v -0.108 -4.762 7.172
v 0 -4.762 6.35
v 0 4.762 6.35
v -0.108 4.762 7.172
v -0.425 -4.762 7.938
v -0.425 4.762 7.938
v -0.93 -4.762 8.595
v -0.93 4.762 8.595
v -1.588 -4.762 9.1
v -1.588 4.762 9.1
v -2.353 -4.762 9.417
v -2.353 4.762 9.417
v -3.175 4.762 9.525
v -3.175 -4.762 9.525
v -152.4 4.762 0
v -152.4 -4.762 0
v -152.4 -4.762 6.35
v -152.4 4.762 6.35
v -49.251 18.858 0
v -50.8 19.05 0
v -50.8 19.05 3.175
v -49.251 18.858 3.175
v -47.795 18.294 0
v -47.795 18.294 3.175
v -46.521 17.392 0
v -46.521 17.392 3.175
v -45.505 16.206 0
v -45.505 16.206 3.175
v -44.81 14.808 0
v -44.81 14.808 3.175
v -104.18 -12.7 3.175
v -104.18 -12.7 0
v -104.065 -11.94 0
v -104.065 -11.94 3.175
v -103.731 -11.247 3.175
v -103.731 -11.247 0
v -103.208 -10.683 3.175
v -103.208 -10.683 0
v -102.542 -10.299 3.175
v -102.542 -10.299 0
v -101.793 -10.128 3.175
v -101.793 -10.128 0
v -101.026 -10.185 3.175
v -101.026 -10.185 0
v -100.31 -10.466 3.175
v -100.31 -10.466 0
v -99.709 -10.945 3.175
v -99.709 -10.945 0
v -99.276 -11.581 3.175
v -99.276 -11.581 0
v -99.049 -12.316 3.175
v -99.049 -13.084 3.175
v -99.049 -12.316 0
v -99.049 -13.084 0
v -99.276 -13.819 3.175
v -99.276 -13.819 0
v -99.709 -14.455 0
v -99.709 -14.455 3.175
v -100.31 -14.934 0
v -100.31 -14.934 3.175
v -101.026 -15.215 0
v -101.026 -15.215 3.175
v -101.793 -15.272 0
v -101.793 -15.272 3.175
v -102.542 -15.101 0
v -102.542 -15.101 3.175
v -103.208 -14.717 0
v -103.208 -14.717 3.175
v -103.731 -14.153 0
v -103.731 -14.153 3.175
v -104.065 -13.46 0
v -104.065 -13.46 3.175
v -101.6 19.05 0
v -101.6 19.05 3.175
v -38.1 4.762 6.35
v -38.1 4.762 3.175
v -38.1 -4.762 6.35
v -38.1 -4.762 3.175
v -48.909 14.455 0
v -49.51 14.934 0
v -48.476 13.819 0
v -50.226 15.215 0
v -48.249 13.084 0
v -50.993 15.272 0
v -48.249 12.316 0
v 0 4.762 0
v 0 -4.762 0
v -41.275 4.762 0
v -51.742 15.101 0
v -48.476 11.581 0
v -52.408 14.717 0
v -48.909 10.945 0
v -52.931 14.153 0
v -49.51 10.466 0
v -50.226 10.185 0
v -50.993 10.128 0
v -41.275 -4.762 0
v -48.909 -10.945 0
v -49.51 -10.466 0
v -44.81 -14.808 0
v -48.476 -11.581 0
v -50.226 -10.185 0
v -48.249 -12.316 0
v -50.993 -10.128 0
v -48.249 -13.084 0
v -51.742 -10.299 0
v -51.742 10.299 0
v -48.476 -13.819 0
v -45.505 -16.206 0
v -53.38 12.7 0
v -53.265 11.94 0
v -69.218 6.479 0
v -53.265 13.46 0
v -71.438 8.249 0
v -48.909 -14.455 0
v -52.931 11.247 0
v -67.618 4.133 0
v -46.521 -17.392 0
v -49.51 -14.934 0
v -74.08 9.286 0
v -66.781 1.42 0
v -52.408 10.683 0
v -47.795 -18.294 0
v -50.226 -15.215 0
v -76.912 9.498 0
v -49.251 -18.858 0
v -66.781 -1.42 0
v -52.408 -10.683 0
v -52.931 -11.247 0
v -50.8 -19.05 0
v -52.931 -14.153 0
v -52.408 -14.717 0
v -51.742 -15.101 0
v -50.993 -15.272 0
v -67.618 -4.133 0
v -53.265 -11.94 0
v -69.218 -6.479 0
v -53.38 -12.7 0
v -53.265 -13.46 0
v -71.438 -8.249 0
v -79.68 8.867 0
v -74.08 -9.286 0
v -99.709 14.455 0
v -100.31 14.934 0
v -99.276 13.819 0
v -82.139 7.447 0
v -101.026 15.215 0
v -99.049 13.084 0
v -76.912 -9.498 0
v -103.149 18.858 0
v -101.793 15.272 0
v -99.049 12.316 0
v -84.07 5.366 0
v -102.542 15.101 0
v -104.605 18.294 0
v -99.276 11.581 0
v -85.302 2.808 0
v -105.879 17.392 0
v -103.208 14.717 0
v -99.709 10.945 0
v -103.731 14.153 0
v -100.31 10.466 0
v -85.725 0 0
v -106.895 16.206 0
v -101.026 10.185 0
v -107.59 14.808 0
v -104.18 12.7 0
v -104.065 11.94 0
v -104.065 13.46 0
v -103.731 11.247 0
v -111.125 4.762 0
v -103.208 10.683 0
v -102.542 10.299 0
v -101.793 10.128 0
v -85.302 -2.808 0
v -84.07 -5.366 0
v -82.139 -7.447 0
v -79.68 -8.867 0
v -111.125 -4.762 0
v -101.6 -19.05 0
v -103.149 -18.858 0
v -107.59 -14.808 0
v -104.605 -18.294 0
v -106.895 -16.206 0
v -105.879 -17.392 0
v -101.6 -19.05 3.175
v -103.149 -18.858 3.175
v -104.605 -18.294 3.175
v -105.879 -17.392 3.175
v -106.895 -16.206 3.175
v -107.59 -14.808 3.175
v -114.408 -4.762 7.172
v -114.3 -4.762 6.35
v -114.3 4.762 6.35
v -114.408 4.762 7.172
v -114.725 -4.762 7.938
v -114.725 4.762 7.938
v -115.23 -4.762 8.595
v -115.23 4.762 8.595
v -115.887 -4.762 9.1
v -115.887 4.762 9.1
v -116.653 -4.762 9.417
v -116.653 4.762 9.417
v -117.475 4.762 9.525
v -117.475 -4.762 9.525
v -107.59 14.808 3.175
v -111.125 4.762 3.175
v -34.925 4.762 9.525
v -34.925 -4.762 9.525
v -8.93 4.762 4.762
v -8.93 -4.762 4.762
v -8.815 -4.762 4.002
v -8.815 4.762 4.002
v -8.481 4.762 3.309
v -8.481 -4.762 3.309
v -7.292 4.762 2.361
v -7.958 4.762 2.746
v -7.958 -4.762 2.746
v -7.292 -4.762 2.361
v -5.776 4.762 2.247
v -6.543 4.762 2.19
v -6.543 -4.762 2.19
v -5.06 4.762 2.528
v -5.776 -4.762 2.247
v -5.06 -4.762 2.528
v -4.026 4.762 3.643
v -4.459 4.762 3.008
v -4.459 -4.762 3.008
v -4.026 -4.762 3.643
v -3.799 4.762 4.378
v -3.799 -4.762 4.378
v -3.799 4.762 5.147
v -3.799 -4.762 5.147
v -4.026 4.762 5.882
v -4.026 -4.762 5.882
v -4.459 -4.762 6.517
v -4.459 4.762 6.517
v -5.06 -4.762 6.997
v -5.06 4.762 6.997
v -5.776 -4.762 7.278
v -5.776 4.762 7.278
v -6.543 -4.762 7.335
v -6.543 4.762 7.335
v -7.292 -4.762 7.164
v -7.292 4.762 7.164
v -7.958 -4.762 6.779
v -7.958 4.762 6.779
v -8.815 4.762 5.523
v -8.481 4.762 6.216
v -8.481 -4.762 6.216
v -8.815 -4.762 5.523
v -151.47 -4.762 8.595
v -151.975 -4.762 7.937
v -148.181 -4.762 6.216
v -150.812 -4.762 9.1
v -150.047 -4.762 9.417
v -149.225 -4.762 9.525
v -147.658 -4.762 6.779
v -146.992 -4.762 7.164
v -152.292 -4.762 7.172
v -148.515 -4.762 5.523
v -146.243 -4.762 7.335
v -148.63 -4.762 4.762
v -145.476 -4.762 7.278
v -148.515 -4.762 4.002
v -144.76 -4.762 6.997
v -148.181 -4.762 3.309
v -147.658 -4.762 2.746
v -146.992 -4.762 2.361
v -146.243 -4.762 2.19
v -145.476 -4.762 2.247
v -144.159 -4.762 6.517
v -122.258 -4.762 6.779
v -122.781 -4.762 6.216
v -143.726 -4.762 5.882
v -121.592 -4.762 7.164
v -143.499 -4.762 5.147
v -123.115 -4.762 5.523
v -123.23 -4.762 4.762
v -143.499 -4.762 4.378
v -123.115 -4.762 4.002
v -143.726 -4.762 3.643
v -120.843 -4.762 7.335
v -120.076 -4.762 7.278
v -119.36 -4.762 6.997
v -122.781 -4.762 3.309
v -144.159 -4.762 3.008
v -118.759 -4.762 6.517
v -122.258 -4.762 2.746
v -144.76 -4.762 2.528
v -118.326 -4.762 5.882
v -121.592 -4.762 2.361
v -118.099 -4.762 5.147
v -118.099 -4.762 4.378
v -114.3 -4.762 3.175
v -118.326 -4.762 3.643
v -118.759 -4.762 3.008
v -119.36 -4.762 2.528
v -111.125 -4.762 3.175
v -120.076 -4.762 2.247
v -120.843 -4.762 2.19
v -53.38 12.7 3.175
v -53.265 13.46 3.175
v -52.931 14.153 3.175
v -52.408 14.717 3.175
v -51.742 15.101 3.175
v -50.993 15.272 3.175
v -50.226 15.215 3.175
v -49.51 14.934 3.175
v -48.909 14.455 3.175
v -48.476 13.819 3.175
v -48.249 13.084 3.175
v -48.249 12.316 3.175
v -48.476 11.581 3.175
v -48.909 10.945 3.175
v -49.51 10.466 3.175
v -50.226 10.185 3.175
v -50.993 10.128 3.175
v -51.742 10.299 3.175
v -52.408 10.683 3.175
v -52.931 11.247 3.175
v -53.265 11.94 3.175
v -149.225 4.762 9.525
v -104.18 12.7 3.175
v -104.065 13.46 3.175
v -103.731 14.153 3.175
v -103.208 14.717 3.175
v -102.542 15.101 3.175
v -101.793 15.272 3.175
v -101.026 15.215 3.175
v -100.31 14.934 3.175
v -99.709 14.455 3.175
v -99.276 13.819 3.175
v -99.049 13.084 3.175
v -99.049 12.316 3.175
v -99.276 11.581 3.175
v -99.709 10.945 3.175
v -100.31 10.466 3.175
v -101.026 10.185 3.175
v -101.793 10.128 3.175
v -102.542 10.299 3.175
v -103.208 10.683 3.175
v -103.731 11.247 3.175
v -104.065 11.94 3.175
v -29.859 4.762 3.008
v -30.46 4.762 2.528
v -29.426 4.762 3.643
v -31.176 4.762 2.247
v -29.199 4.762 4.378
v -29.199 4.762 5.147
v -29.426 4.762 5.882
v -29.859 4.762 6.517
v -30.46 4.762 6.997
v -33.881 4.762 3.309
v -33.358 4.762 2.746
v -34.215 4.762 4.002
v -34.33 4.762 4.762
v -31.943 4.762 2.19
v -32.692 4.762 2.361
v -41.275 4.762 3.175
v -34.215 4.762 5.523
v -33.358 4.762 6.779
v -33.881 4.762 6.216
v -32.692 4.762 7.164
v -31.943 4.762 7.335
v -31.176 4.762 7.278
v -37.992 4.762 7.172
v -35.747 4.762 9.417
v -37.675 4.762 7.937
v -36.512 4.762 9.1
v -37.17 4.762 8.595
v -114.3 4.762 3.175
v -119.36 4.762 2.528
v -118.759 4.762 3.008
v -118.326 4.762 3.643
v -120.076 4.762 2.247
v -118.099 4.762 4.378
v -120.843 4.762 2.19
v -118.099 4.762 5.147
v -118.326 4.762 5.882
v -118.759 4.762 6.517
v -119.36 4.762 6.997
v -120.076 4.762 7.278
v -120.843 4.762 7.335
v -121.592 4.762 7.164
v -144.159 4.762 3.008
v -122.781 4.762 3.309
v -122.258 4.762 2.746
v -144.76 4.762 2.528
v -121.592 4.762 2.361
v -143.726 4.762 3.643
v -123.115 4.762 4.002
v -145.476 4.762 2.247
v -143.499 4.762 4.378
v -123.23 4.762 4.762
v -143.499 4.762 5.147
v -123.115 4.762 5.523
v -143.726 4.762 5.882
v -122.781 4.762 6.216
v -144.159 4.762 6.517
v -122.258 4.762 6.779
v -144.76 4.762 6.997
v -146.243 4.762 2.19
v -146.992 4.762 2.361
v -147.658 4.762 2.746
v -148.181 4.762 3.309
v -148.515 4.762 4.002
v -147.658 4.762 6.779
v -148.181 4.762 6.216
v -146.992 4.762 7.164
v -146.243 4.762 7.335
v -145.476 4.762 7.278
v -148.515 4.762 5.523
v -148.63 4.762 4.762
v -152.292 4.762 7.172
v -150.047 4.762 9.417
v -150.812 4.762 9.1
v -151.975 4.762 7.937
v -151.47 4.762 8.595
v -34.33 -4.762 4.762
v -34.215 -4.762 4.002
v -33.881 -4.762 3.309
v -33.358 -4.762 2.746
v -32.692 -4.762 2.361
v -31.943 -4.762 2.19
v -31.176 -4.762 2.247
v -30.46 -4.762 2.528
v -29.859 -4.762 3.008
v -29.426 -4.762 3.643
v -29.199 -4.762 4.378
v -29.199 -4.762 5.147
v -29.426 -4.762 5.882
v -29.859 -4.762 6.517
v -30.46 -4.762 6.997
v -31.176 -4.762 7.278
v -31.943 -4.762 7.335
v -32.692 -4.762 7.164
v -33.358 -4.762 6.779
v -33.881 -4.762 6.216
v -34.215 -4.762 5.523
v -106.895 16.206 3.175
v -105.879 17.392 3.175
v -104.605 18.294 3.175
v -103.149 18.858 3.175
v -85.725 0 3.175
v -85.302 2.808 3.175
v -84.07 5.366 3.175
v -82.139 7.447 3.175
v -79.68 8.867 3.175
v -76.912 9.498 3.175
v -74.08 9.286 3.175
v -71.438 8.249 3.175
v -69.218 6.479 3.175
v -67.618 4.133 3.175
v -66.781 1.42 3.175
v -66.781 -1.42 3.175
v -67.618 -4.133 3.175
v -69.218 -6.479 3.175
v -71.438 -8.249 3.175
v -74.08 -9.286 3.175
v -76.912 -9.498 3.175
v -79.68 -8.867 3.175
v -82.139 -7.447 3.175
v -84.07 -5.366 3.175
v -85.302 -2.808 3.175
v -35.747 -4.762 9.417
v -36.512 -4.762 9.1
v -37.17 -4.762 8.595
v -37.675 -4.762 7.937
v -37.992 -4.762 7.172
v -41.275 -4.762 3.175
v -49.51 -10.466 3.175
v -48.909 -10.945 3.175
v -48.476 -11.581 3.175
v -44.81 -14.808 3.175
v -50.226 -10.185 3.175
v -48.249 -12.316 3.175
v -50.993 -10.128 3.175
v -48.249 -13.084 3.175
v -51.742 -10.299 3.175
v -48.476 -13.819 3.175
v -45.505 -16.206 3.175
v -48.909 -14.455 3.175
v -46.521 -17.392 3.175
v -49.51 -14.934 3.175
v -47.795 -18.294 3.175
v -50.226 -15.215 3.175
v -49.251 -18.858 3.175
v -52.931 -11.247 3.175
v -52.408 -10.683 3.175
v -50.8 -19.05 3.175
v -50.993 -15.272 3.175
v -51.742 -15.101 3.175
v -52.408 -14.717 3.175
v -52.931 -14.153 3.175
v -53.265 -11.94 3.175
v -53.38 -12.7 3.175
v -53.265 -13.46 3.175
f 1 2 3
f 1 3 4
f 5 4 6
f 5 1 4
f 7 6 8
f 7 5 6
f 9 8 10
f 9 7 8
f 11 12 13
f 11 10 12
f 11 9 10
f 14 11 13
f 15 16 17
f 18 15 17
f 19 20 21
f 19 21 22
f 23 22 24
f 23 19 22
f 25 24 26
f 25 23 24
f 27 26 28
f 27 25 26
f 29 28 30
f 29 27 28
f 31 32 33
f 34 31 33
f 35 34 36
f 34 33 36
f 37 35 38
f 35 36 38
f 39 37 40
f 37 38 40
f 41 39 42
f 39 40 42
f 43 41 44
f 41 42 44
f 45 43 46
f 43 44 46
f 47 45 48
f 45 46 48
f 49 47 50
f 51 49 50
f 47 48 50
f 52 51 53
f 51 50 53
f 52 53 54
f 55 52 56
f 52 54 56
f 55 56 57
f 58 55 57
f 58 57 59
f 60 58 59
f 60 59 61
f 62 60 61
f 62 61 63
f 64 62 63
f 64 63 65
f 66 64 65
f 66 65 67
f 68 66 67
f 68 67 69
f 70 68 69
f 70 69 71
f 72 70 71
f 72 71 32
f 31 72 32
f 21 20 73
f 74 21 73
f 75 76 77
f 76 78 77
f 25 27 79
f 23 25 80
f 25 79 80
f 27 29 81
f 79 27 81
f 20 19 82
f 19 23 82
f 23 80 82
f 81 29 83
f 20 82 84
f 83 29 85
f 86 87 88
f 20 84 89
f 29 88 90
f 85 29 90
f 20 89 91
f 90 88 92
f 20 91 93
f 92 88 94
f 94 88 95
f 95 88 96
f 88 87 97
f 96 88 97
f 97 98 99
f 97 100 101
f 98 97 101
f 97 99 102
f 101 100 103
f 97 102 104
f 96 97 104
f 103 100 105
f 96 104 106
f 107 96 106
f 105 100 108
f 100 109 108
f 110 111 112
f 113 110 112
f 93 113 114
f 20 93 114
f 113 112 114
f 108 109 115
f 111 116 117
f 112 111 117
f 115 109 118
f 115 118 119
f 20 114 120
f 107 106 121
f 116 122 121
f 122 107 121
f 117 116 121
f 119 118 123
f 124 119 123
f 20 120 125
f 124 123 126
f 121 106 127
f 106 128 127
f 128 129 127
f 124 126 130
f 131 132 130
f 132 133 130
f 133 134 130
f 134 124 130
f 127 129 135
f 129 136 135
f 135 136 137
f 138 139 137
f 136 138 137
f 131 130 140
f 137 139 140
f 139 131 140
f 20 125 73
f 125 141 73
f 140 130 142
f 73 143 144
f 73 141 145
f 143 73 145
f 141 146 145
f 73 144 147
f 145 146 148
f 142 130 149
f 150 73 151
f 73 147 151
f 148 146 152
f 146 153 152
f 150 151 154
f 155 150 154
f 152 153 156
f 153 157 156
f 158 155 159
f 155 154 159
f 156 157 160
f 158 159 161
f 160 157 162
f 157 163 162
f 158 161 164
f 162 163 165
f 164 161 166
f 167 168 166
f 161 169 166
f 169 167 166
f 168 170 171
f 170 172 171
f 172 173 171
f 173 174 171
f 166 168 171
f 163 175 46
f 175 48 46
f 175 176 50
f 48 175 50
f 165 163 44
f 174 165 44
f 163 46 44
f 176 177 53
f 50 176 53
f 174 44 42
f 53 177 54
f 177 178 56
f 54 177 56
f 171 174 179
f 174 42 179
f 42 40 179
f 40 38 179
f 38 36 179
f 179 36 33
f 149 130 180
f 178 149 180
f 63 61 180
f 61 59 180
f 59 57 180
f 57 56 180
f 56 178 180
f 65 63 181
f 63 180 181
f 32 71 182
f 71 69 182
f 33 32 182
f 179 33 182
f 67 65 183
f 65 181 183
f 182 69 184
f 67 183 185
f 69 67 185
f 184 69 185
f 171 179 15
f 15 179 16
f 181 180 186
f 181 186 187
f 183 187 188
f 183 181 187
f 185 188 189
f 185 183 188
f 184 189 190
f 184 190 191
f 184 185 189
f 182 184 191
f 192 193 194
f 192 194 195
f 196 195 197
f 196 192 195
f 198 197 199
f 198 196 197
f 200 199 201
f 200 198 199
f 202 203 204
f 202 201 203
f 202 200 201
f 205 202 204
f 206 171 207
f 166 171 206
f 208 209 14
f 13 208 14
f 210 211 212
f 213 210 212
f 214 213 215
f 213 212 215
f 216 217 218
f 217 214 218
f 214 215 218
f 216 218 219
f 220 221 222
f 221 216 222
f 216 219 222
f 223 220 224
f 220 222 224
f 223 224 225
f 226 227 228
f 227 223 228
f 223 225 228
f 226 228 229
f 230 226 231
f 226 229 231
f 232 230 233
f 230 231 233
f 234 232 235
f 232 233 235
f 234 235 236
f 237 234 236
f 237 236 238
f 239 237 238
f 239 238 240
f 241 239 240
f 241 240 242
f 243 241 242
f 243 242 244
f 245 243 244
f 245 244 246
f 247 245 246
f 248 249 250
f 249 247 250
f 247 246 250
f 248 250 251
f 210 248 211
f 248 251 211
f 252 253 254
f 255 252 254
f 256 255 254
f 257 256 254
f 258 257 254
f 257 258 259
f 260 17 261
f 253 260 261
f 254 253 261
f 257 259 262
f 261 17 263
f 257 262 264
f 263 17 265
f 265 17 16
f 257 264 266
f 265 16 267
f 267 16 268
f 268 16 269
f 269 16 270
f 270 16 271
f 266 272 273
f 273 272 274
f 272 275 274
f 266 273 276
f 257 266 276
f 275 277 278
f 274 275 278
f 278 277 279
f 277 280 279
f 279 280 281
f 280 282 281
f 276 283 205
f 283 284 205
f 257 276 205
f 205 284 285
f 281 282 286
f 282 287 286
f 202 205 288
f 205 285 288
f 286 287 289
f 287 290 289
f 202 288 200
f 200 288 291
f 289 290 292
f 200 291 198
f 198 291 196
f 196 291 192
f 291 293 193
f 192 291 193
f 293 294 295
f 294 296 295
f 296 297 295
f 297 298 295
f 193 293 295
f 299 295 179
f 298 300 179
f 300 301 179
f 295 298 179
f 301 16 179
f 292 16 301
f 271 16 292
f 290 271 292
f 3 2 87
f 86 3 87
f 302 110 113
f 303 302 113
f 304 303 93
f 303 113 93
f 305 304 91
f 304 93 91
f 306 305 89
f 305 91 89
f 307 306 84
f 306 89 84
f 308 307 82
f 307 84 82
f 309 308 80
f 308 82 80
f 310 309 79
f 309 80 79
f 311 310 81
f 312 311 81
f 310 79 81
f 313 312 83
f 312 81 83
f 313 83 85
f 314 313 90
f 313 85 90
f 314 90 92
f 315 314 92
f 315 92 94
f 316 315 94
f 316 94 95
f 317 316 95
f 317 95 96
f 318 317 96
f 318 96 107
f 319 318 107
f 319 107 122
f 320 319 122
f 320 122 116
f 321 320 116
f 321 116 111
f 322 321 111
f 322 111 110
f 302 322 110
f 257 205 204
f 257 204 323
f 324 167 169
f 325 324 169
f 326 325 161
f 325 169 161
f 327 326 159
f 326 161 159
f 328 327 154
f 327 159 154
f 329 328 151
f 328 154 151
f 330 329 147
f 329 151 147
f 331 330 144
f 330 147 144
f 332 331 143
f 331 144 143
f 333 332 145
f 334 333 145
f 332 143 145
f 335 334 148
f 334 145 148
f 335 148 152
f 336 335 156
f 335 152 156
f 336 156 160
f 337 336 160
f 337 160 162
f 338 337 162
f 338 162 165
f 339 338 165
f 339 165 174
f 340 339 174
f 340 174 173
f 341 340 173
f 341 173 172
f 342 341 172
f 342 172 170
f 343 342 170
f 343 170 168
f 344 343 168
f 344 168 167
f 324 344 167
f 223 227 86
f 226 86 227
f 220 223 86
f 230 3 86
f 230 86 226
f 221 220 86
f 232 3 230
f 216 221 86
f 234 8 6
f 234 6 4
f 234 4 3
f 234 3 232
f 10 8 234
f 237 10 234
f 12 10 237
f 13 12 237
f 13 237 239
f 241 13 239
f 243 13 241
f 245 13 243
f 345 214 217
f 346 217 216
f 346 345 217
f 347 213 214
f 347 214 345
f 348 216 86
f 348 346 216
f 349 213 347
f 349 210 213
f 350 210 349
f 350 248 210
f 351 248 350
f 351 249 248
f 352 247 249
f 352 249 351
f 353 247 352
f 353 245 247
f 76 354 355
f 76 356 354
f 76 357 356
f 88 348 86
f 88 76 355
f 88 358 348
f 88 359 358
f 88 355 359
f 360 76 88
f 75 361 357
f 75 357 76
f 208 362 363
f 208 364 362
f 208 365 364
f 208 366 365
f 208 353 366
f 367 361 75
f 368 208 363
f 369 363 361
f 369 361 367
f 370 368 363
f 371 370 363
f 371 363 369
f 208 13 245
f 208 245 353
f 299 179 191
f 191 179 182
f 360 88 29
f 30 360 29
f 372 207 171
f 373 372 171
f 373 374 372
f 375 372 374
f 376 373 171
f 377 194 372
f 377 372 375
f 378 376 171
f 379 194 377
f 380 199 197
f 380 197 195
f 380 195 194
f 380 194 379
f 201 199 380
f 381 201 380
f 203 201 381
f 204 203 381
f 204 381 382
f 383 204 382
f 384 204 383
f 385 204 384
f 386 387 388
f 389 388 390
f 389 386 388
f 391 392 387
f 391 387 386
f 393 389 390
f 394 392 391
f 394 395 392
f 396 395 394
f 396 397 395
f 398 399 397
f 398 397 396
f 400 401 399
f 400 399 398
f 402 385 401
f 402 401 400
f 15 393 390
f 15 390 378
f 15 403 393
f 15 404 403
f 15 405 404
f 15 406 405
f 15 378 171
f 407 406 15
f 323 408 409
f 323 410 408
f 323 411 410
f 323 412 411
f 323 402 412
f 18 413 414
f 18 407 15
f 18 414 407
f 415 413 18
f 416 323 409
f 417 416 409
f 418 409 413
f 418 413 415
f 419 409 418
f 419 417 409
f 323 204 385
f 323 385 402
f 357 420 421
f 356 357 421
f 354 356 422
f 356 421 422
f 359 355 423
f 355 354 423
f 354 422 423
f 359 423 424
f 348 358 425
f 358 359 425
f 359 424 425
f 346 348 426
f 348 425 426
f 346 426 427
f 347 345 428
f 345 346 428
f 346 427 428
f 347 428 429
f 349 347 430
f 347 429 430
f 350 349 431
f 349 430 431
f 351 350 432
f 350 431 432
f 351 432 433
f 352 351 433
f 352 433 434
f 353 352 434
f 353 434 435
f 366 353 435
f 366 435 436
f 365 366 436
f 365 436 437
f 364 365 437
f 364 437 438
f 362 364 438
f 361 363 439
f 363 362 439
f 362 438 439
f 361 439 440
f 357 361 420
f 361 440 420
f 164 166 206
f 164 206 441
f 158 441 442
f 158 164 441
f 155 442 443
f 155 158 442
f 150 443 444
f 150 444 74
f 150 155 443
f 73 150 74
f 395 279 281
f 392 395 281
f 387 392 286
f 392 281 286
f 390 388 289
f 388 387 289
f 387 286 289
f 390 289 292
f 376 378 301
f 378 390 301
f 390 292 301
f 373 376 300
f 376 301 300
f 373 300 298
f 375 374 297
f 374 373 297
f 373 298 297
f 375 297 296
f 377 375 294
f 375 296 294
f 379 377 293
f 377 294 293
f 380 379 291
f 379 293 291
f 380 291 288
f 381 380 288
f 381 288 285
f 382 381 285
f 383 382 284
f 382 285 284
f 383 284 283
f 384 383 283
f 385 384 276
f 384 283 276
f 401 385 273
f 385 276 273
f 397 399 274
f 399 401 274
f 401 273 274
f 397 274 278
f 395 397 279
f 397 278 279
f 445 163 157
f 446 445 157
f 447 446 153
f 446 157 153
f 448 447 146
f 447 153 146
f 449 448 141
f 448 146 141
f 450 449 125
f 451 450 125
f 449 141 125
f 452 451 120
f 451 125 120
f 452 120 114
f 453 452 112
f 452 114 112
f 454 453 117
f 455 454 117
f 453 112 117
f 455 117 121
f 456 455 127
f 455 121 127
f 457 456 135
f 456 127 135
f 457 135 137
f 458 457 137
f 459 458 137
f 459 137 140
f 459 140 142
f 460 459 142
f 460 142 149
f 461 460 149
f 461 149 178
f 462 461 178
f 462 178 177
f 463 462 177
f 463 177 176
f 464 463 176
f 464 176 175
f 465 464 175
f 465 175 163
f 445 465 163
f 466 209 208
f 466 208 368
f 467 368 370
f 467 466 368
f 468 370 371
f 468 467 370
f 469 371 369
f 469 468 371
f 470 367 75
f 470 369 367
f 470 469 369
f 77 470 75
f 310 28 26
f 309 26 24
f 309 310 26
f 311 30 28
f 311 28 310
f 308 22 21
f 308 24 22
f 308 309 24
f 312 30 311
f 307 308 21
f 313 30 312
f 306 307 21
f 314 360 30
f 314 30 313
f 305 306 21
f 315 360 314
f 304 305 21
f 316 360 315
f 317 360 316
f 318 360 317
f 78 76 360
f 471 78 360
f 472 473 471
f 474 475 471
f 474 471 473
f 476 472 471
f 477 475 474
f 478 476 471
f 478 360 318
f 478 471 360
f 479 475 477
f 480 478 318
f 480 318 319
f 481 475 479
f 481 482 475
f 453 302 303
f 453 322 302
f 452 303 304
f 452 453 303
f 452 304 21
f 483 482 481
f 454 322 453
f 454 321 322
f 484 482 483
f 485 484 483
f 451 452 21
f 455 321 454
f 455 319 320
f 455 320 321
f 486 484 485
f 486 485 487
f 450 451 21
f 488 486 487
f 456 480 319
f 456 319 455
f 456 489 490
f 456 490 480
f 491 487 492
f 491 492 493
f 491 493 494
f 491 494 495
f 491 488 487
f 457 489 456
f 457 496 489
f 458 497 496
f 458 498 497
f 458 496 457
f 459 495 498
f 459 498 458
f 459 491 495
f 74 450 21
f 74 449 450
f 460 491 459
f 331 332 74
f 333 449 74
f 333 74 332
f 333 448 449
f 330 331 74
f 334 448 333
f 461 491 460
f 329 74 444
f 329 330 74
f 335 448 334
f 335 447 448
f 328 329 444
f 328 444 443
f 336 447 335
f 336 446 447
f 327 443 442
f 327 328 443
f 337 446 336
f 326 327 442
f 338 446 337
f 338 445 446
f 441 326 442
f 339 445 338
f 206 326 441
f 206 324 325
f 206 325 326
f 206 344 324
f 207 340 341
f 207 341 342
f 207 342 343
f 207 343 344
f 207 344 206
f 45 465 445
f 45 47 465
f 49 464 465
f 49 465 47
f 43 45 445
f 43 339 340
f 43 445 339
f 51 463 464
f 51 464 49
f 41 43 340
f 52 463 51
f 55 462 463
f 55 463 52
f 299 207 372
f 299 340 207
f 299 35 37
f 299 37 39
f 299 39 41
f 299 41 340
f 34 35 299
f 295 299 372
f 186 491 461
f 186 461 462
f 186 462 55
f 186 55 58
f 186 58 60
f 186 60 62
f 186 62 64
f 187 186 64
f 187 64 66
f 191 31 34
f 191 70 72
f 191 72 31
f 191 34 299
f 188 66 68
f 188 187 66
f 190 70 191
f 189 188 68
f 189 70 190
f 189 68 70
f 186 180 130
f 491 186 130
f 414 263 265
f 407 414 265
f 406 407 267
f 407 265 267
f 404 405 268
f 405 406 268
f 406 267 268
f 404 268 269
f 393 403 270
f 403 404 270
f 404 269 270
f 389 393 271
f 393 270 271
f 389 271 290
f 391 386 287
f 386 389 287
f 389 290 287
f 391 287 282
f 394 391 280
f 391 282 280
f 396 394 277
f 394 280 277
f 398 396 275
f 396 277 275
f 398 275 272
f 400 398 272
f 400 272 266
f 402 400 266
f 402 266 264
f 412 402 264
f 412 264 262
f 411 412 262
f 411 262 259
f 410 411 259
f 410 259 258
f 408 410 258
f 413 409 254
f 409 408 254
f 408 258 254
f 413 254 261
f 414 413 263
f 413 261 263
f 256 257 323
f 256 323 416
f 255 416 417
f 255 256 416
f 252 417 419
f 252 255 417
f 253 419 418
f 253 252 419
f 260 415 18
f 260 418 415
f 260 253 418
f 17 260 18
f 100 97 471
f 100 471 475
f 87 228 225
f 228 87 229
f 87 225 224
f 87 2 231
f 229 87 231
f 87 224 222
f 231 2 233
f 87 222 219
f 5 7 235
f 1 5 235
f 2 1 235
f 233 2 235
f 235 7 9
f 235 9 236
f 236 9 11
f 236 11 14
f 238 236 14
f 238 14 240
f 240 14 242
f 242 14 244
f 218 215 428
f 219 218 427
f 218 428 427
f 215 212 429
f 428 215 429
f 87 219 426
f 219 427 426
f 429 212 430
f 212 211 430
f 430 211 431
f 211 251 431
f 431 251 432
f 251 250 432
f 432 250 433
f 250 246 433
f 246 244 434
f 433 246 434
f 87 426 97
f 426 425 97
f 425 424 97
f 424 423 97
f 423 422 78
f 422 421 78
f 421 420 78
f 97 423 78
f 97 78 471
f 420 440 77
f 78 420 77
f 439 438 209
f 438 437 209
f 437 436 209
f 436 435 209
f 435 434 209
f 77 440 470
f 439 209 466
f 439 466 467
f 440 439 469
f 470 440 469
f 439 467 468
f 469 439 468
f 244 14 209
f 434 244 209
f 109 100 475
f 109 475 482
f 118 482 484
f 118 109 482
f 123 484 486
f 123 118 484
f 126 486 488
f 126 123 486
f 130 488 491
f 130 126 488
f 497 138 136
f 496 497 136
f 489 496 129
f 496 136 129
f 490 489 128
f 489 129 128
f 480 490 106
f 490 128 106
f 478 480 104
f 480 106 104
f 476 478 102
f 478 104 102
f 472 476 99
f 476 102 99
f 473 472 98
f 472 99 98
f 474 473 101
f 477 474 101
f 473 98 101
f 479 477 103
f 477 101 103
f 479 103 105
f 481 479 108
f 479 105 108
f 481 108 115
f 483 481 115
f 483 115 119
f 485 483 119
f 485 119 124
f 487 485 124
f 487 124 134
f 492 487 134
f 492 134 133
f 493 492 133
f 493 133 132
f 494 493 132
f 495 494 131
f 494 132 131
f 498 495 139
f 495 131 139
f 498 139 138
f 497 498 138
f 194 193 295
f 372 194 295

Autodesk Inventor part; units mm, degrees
ref_plane "YZ Plane" through (0, 0, 0) normal (1, 0, 0) x (0, 1, 0)
ref_plane "XZ Plane" through (0, 0, 0) normal (0, 1, 0) x (-1, 0, 0)
ref_plane "XY Plane" through (0, 0, 0) normal (0, 0, 1) x (1, 0, 0)
sketch "Sketch1" plane through (0, 0, 0) normal (0, 1, 0) x (-1, 0, 0)
  line L0 (0, 0) -> (152.4, 0)
  line L1 (152.4, 0) -> (152.4, 6.35)
  line L2 (34.925, 9.525) -> (3.175, 9.525)
  line L3 (0, 6.35) -> (0, 0)
  circle A0 centre (6.35, 4.7625) radius 2.5797
  circle A1 centre (31.75, 4.7625) radius 2.5797
  circle A2 centre (120.65, 4.7625) radius 2.5797
  circle A3 centre (146.05, 4.7625) radius 2.5797
  line L4 (38.1, 9.525) -> (114.3, 9.525)
  line L5 (114.3, 6.35) -> (114.3, 4.7625)
  line L6 (38.1, 4.7625) -> (38.1, 6.35)
  arc A4 (38.1, 6.35) -> (34.925, 9.525) centre (34.925, 6.35) ccw
  arc A5 (3.175, 9.525) -> (0, 6.35) centre (3.175, 6.35) ccw
  line L7 (117.475, 9.525) -> (149.225, 9.525)
  arc A6 (117.475, 9.525) -> (114.3, 6.35) centre (117.475, 6.35) ccw
  arc A7 (152.4, 6.35) -> (149.225, 9.525) centre (149.225, 6.35) ccw
  line L8 (114.3, 6.35) -> (114.3, 0)
  line L9 (38.1, 6.35) -> (38.1, 0)
  line L10 (114.3, 4.7625) -> (114.3, 9.525)
  line L11 (117.475, 9.525) -> (114.3, 9.525)
  line L12 (38.1, 6.35) -> (38.1, 9.525)
  line L13 (38.1, 9.525) -> (34.925, 9.525)
  line L14 (38.1, 3.175) -> (114.3, 3.175)
  point P0 (152.4, 9.525)
  point P1 (0, 9.525)
  dimension "d0" = 152.4
  dimension "d1" = 9.525
  dimension "d2" = 4.7625
  dimension "d3" = 4.7625
  dimension "d4" = 4.7625
  dimension "d5" = 4.7625
  dimension "d6" = 25.4
  dimension "d7" = 25.4
  dimension "d8" = 5.1594
  dimension "d9" = 6.35
  dimension "d10" = 6.35
  dimension "d11" = 4.7625
  dimension "d12" = 6.35
  dimension "d13" = 6.35
  dimension "d14" = 3.175
  dimension "d15" = 3.175
  dimension "d37" = 3.175
extrude "Extrusion1" add sketch "Sketch1" along normal mid plane 9.525 contours L3 A5 L2 A4 L6 L9 L0 | L9 L14 L8 L0 | L8 L5 A6 L7 A7 L1 L0
extrude "Extrusion2" add sketch "Sketch1" along normal mid plane 50.8 contours L9 L14 L8 L0
sketch "Sketch3" plane through (-152.4, -4.7625, 0) normal (0, 0, -1) x (-1, 0, 0)
  line L0 (-38.1, -20.6375) -> (-38.1, 0)
  line L1 (-114.3, 30.1625) -> (-38.1, 30.1625)
  line L2 (-38.1, 30.1625) -> (-38.1, -20.6375)
  line L3 (-38.1, -20.6375) -> (-114.3, -20.6375)
  line L4 (-114.3, -20.6375) -> (-114.3, 30.1625)
  circle A0 centre (-76.2, 4.7625) radius 9.525
  line L5 (-101.6, -20.6375) -> (-101.6, 30.1625)
  line L6 (-101.6, 30.1625) -> (-50.8, 30.1625)
  line L7 (-50.8, 30.1625) -> (-50.8, -20.6375)
  line L8 (-50.8, -20.6375) -> (-101.6, -20.6375)
  line L9 (-101.6, 17.4625) -> (-50.8, 17.4625)
  line L10 (-50.8, 17.4625) -> (-50.8, -7.9375)
  line L11 (-50.8, -7.9375) -> (-101.6, -7.9375)
  line L12 (-101.6, -7.9375) -> (-101.6, 17.4625)
  circle A1 centre (-101.6, 17.4625) radius 2.5797
  circle A2 centre (-101.6, -7.9375) radius 2.5797
  circle A3 centre (-50.8, -7.9375) radius 2.5797
  circle A4 centre (-50.8, 17.4625) radius 2.5797
  circle A5 centre (-101.6, 17.4625) radius 6.35
  circle A6 centre (-101.6, -7.9375) radius 6.35
  circle A7 centre (-50.8, -7.9375) radius 6.35
  circle A8 centre (-50.8, 17.4625) radius 6.35
  line L13 (-107.95, 23.8125) -> (-44.45, 23.8125)
  line L14 (-44.45, 23.8125) -> (-44.45, -14.2875)
  line L15 (-44.45, -14.2875) -> (-107.95, -14.2875)
  line L16 (-107.95, -14.2875) -> (-107.95, 23.8125)
  line L17 (-114.3, 9.525) -> (-117.475, 9.525)
  line L18 (-114.3, 0) -> (-114.3, 9.525)
  line L19 (-38.1, 0) -> (-38.1, 9.525)
  line L20 (-114.3, 9.525) -> (-107.95, 9.525)
  line L21 (-111.125, 9.525) -> (-101.3931, 37.1795)
  line L22 (-114.3, 0) -> (-114.3, 9.525)
  line L23 (-114.3, 0) -> (-107.95, 0)
  line L24 (-111.125, 0) -> (-100.7566, -29.4634)
  line L25 (-38.1, 0) -> (-44.45, 0)
  line L26 (-38.1, 9.525) -> (-38.1, 30.1625)
  line L27 (-38.1, 9.525) -> (-44.45, 9.525)
  line L28 (-41.275, 9.525) -> (-52.247, 40.7036)
  line L29 (-41.275, 0) -> (-51.6214, -29.4007)
  line L30 (0, 0) -> (-38.1, 0) projected
  line L31 (-114.3, 9.525) -> (-114.3, 30.1625) projected
  point P0 (-152.4, 4.7625)
  point P1 (-41.275, 0)
  point P2 (-107.5899, 19.5704)
  point P3 (-101.6, 23.8125)
  point P4 (-50.8, 23.8125)
  point P5 (-44.8101, 19.5704)
  point P6 (-38.1, 0)
  point P7 (-44.8101, -10.0454)
  point P8 (-50.8, -14.2875)
  point P9 (-101.6, -14.2875)
  point P10 (-107.5899, -10.0454)
  dimension "d38" = 25.4
  dimension "d39" = 38.1
  dimension "d40" = 50.8
  dimension "d41" = 25.4
  dimension "d42" = 12.7
  dimension "d43" = 19.05
  dimension "d44" = 5.1594
  dimension "d45" = 12.7
  dimension "d46" = 12.7
  dimension "d47" = 12.7
  dimension "d48" = 12.7
  dimension "d49" = 160.613
  dimension "d50" = 160.613
  dimension "d51" = 6.35
  dimension "d52" = 76.2
  dimension "d53" = 30.1625
  dimension "d54" = 13.5214
  dimension "d55" = 14.147
  dimension "d56" = 62.6566
  dimension "d57" = 63.2931
  dimension "d58" = 79.375
extrude "Extrusion4" cut sketch "Sketch3" against normal blind 50.8 contours L3 L29 L15 L14 L25 L0 | L3 L7 L15 L29 | L27 L28 L14 L13 L1 L2 | L3 L5 L15 L7 | L29 L14 L15 | L15 A7 L29 | L3 L24 L15 L5 | L28 L13 L7 L1 | L28 L13 L14 | L3 L4 L23 L24 L16 L15 | L15 L24 A6 | A3 L11 L7 | L7 A3 | L7 L13 L5 L1 | L28 A8 L13 | L15 L16 L24 | A2 L5 | L5 L11 A2 | L11 A3 L7 | L5 L13 L21 L1 | L5 A2 L11 | L21 L13 L16 L20 L4 L1 | A5 L21 L13 | A4 L7 | L7 L9 A4 | A4 L9 L7 | L21 L16 L13 | A1 L9 L5 | L5 A1 | L5 L9 A1 | A0
equation "\"d2\" = 0.5 * d1"
equation "\"d3\" = d2"
equation "\"d4\" = d2"
equation "\"d5\" = d2"
equation "\"d10\" = d9"
equation "\"d11\" = 0.5 * d1"
equation "\"d37\" = 0.333333 * d1"
properties part number "Face Plate"
